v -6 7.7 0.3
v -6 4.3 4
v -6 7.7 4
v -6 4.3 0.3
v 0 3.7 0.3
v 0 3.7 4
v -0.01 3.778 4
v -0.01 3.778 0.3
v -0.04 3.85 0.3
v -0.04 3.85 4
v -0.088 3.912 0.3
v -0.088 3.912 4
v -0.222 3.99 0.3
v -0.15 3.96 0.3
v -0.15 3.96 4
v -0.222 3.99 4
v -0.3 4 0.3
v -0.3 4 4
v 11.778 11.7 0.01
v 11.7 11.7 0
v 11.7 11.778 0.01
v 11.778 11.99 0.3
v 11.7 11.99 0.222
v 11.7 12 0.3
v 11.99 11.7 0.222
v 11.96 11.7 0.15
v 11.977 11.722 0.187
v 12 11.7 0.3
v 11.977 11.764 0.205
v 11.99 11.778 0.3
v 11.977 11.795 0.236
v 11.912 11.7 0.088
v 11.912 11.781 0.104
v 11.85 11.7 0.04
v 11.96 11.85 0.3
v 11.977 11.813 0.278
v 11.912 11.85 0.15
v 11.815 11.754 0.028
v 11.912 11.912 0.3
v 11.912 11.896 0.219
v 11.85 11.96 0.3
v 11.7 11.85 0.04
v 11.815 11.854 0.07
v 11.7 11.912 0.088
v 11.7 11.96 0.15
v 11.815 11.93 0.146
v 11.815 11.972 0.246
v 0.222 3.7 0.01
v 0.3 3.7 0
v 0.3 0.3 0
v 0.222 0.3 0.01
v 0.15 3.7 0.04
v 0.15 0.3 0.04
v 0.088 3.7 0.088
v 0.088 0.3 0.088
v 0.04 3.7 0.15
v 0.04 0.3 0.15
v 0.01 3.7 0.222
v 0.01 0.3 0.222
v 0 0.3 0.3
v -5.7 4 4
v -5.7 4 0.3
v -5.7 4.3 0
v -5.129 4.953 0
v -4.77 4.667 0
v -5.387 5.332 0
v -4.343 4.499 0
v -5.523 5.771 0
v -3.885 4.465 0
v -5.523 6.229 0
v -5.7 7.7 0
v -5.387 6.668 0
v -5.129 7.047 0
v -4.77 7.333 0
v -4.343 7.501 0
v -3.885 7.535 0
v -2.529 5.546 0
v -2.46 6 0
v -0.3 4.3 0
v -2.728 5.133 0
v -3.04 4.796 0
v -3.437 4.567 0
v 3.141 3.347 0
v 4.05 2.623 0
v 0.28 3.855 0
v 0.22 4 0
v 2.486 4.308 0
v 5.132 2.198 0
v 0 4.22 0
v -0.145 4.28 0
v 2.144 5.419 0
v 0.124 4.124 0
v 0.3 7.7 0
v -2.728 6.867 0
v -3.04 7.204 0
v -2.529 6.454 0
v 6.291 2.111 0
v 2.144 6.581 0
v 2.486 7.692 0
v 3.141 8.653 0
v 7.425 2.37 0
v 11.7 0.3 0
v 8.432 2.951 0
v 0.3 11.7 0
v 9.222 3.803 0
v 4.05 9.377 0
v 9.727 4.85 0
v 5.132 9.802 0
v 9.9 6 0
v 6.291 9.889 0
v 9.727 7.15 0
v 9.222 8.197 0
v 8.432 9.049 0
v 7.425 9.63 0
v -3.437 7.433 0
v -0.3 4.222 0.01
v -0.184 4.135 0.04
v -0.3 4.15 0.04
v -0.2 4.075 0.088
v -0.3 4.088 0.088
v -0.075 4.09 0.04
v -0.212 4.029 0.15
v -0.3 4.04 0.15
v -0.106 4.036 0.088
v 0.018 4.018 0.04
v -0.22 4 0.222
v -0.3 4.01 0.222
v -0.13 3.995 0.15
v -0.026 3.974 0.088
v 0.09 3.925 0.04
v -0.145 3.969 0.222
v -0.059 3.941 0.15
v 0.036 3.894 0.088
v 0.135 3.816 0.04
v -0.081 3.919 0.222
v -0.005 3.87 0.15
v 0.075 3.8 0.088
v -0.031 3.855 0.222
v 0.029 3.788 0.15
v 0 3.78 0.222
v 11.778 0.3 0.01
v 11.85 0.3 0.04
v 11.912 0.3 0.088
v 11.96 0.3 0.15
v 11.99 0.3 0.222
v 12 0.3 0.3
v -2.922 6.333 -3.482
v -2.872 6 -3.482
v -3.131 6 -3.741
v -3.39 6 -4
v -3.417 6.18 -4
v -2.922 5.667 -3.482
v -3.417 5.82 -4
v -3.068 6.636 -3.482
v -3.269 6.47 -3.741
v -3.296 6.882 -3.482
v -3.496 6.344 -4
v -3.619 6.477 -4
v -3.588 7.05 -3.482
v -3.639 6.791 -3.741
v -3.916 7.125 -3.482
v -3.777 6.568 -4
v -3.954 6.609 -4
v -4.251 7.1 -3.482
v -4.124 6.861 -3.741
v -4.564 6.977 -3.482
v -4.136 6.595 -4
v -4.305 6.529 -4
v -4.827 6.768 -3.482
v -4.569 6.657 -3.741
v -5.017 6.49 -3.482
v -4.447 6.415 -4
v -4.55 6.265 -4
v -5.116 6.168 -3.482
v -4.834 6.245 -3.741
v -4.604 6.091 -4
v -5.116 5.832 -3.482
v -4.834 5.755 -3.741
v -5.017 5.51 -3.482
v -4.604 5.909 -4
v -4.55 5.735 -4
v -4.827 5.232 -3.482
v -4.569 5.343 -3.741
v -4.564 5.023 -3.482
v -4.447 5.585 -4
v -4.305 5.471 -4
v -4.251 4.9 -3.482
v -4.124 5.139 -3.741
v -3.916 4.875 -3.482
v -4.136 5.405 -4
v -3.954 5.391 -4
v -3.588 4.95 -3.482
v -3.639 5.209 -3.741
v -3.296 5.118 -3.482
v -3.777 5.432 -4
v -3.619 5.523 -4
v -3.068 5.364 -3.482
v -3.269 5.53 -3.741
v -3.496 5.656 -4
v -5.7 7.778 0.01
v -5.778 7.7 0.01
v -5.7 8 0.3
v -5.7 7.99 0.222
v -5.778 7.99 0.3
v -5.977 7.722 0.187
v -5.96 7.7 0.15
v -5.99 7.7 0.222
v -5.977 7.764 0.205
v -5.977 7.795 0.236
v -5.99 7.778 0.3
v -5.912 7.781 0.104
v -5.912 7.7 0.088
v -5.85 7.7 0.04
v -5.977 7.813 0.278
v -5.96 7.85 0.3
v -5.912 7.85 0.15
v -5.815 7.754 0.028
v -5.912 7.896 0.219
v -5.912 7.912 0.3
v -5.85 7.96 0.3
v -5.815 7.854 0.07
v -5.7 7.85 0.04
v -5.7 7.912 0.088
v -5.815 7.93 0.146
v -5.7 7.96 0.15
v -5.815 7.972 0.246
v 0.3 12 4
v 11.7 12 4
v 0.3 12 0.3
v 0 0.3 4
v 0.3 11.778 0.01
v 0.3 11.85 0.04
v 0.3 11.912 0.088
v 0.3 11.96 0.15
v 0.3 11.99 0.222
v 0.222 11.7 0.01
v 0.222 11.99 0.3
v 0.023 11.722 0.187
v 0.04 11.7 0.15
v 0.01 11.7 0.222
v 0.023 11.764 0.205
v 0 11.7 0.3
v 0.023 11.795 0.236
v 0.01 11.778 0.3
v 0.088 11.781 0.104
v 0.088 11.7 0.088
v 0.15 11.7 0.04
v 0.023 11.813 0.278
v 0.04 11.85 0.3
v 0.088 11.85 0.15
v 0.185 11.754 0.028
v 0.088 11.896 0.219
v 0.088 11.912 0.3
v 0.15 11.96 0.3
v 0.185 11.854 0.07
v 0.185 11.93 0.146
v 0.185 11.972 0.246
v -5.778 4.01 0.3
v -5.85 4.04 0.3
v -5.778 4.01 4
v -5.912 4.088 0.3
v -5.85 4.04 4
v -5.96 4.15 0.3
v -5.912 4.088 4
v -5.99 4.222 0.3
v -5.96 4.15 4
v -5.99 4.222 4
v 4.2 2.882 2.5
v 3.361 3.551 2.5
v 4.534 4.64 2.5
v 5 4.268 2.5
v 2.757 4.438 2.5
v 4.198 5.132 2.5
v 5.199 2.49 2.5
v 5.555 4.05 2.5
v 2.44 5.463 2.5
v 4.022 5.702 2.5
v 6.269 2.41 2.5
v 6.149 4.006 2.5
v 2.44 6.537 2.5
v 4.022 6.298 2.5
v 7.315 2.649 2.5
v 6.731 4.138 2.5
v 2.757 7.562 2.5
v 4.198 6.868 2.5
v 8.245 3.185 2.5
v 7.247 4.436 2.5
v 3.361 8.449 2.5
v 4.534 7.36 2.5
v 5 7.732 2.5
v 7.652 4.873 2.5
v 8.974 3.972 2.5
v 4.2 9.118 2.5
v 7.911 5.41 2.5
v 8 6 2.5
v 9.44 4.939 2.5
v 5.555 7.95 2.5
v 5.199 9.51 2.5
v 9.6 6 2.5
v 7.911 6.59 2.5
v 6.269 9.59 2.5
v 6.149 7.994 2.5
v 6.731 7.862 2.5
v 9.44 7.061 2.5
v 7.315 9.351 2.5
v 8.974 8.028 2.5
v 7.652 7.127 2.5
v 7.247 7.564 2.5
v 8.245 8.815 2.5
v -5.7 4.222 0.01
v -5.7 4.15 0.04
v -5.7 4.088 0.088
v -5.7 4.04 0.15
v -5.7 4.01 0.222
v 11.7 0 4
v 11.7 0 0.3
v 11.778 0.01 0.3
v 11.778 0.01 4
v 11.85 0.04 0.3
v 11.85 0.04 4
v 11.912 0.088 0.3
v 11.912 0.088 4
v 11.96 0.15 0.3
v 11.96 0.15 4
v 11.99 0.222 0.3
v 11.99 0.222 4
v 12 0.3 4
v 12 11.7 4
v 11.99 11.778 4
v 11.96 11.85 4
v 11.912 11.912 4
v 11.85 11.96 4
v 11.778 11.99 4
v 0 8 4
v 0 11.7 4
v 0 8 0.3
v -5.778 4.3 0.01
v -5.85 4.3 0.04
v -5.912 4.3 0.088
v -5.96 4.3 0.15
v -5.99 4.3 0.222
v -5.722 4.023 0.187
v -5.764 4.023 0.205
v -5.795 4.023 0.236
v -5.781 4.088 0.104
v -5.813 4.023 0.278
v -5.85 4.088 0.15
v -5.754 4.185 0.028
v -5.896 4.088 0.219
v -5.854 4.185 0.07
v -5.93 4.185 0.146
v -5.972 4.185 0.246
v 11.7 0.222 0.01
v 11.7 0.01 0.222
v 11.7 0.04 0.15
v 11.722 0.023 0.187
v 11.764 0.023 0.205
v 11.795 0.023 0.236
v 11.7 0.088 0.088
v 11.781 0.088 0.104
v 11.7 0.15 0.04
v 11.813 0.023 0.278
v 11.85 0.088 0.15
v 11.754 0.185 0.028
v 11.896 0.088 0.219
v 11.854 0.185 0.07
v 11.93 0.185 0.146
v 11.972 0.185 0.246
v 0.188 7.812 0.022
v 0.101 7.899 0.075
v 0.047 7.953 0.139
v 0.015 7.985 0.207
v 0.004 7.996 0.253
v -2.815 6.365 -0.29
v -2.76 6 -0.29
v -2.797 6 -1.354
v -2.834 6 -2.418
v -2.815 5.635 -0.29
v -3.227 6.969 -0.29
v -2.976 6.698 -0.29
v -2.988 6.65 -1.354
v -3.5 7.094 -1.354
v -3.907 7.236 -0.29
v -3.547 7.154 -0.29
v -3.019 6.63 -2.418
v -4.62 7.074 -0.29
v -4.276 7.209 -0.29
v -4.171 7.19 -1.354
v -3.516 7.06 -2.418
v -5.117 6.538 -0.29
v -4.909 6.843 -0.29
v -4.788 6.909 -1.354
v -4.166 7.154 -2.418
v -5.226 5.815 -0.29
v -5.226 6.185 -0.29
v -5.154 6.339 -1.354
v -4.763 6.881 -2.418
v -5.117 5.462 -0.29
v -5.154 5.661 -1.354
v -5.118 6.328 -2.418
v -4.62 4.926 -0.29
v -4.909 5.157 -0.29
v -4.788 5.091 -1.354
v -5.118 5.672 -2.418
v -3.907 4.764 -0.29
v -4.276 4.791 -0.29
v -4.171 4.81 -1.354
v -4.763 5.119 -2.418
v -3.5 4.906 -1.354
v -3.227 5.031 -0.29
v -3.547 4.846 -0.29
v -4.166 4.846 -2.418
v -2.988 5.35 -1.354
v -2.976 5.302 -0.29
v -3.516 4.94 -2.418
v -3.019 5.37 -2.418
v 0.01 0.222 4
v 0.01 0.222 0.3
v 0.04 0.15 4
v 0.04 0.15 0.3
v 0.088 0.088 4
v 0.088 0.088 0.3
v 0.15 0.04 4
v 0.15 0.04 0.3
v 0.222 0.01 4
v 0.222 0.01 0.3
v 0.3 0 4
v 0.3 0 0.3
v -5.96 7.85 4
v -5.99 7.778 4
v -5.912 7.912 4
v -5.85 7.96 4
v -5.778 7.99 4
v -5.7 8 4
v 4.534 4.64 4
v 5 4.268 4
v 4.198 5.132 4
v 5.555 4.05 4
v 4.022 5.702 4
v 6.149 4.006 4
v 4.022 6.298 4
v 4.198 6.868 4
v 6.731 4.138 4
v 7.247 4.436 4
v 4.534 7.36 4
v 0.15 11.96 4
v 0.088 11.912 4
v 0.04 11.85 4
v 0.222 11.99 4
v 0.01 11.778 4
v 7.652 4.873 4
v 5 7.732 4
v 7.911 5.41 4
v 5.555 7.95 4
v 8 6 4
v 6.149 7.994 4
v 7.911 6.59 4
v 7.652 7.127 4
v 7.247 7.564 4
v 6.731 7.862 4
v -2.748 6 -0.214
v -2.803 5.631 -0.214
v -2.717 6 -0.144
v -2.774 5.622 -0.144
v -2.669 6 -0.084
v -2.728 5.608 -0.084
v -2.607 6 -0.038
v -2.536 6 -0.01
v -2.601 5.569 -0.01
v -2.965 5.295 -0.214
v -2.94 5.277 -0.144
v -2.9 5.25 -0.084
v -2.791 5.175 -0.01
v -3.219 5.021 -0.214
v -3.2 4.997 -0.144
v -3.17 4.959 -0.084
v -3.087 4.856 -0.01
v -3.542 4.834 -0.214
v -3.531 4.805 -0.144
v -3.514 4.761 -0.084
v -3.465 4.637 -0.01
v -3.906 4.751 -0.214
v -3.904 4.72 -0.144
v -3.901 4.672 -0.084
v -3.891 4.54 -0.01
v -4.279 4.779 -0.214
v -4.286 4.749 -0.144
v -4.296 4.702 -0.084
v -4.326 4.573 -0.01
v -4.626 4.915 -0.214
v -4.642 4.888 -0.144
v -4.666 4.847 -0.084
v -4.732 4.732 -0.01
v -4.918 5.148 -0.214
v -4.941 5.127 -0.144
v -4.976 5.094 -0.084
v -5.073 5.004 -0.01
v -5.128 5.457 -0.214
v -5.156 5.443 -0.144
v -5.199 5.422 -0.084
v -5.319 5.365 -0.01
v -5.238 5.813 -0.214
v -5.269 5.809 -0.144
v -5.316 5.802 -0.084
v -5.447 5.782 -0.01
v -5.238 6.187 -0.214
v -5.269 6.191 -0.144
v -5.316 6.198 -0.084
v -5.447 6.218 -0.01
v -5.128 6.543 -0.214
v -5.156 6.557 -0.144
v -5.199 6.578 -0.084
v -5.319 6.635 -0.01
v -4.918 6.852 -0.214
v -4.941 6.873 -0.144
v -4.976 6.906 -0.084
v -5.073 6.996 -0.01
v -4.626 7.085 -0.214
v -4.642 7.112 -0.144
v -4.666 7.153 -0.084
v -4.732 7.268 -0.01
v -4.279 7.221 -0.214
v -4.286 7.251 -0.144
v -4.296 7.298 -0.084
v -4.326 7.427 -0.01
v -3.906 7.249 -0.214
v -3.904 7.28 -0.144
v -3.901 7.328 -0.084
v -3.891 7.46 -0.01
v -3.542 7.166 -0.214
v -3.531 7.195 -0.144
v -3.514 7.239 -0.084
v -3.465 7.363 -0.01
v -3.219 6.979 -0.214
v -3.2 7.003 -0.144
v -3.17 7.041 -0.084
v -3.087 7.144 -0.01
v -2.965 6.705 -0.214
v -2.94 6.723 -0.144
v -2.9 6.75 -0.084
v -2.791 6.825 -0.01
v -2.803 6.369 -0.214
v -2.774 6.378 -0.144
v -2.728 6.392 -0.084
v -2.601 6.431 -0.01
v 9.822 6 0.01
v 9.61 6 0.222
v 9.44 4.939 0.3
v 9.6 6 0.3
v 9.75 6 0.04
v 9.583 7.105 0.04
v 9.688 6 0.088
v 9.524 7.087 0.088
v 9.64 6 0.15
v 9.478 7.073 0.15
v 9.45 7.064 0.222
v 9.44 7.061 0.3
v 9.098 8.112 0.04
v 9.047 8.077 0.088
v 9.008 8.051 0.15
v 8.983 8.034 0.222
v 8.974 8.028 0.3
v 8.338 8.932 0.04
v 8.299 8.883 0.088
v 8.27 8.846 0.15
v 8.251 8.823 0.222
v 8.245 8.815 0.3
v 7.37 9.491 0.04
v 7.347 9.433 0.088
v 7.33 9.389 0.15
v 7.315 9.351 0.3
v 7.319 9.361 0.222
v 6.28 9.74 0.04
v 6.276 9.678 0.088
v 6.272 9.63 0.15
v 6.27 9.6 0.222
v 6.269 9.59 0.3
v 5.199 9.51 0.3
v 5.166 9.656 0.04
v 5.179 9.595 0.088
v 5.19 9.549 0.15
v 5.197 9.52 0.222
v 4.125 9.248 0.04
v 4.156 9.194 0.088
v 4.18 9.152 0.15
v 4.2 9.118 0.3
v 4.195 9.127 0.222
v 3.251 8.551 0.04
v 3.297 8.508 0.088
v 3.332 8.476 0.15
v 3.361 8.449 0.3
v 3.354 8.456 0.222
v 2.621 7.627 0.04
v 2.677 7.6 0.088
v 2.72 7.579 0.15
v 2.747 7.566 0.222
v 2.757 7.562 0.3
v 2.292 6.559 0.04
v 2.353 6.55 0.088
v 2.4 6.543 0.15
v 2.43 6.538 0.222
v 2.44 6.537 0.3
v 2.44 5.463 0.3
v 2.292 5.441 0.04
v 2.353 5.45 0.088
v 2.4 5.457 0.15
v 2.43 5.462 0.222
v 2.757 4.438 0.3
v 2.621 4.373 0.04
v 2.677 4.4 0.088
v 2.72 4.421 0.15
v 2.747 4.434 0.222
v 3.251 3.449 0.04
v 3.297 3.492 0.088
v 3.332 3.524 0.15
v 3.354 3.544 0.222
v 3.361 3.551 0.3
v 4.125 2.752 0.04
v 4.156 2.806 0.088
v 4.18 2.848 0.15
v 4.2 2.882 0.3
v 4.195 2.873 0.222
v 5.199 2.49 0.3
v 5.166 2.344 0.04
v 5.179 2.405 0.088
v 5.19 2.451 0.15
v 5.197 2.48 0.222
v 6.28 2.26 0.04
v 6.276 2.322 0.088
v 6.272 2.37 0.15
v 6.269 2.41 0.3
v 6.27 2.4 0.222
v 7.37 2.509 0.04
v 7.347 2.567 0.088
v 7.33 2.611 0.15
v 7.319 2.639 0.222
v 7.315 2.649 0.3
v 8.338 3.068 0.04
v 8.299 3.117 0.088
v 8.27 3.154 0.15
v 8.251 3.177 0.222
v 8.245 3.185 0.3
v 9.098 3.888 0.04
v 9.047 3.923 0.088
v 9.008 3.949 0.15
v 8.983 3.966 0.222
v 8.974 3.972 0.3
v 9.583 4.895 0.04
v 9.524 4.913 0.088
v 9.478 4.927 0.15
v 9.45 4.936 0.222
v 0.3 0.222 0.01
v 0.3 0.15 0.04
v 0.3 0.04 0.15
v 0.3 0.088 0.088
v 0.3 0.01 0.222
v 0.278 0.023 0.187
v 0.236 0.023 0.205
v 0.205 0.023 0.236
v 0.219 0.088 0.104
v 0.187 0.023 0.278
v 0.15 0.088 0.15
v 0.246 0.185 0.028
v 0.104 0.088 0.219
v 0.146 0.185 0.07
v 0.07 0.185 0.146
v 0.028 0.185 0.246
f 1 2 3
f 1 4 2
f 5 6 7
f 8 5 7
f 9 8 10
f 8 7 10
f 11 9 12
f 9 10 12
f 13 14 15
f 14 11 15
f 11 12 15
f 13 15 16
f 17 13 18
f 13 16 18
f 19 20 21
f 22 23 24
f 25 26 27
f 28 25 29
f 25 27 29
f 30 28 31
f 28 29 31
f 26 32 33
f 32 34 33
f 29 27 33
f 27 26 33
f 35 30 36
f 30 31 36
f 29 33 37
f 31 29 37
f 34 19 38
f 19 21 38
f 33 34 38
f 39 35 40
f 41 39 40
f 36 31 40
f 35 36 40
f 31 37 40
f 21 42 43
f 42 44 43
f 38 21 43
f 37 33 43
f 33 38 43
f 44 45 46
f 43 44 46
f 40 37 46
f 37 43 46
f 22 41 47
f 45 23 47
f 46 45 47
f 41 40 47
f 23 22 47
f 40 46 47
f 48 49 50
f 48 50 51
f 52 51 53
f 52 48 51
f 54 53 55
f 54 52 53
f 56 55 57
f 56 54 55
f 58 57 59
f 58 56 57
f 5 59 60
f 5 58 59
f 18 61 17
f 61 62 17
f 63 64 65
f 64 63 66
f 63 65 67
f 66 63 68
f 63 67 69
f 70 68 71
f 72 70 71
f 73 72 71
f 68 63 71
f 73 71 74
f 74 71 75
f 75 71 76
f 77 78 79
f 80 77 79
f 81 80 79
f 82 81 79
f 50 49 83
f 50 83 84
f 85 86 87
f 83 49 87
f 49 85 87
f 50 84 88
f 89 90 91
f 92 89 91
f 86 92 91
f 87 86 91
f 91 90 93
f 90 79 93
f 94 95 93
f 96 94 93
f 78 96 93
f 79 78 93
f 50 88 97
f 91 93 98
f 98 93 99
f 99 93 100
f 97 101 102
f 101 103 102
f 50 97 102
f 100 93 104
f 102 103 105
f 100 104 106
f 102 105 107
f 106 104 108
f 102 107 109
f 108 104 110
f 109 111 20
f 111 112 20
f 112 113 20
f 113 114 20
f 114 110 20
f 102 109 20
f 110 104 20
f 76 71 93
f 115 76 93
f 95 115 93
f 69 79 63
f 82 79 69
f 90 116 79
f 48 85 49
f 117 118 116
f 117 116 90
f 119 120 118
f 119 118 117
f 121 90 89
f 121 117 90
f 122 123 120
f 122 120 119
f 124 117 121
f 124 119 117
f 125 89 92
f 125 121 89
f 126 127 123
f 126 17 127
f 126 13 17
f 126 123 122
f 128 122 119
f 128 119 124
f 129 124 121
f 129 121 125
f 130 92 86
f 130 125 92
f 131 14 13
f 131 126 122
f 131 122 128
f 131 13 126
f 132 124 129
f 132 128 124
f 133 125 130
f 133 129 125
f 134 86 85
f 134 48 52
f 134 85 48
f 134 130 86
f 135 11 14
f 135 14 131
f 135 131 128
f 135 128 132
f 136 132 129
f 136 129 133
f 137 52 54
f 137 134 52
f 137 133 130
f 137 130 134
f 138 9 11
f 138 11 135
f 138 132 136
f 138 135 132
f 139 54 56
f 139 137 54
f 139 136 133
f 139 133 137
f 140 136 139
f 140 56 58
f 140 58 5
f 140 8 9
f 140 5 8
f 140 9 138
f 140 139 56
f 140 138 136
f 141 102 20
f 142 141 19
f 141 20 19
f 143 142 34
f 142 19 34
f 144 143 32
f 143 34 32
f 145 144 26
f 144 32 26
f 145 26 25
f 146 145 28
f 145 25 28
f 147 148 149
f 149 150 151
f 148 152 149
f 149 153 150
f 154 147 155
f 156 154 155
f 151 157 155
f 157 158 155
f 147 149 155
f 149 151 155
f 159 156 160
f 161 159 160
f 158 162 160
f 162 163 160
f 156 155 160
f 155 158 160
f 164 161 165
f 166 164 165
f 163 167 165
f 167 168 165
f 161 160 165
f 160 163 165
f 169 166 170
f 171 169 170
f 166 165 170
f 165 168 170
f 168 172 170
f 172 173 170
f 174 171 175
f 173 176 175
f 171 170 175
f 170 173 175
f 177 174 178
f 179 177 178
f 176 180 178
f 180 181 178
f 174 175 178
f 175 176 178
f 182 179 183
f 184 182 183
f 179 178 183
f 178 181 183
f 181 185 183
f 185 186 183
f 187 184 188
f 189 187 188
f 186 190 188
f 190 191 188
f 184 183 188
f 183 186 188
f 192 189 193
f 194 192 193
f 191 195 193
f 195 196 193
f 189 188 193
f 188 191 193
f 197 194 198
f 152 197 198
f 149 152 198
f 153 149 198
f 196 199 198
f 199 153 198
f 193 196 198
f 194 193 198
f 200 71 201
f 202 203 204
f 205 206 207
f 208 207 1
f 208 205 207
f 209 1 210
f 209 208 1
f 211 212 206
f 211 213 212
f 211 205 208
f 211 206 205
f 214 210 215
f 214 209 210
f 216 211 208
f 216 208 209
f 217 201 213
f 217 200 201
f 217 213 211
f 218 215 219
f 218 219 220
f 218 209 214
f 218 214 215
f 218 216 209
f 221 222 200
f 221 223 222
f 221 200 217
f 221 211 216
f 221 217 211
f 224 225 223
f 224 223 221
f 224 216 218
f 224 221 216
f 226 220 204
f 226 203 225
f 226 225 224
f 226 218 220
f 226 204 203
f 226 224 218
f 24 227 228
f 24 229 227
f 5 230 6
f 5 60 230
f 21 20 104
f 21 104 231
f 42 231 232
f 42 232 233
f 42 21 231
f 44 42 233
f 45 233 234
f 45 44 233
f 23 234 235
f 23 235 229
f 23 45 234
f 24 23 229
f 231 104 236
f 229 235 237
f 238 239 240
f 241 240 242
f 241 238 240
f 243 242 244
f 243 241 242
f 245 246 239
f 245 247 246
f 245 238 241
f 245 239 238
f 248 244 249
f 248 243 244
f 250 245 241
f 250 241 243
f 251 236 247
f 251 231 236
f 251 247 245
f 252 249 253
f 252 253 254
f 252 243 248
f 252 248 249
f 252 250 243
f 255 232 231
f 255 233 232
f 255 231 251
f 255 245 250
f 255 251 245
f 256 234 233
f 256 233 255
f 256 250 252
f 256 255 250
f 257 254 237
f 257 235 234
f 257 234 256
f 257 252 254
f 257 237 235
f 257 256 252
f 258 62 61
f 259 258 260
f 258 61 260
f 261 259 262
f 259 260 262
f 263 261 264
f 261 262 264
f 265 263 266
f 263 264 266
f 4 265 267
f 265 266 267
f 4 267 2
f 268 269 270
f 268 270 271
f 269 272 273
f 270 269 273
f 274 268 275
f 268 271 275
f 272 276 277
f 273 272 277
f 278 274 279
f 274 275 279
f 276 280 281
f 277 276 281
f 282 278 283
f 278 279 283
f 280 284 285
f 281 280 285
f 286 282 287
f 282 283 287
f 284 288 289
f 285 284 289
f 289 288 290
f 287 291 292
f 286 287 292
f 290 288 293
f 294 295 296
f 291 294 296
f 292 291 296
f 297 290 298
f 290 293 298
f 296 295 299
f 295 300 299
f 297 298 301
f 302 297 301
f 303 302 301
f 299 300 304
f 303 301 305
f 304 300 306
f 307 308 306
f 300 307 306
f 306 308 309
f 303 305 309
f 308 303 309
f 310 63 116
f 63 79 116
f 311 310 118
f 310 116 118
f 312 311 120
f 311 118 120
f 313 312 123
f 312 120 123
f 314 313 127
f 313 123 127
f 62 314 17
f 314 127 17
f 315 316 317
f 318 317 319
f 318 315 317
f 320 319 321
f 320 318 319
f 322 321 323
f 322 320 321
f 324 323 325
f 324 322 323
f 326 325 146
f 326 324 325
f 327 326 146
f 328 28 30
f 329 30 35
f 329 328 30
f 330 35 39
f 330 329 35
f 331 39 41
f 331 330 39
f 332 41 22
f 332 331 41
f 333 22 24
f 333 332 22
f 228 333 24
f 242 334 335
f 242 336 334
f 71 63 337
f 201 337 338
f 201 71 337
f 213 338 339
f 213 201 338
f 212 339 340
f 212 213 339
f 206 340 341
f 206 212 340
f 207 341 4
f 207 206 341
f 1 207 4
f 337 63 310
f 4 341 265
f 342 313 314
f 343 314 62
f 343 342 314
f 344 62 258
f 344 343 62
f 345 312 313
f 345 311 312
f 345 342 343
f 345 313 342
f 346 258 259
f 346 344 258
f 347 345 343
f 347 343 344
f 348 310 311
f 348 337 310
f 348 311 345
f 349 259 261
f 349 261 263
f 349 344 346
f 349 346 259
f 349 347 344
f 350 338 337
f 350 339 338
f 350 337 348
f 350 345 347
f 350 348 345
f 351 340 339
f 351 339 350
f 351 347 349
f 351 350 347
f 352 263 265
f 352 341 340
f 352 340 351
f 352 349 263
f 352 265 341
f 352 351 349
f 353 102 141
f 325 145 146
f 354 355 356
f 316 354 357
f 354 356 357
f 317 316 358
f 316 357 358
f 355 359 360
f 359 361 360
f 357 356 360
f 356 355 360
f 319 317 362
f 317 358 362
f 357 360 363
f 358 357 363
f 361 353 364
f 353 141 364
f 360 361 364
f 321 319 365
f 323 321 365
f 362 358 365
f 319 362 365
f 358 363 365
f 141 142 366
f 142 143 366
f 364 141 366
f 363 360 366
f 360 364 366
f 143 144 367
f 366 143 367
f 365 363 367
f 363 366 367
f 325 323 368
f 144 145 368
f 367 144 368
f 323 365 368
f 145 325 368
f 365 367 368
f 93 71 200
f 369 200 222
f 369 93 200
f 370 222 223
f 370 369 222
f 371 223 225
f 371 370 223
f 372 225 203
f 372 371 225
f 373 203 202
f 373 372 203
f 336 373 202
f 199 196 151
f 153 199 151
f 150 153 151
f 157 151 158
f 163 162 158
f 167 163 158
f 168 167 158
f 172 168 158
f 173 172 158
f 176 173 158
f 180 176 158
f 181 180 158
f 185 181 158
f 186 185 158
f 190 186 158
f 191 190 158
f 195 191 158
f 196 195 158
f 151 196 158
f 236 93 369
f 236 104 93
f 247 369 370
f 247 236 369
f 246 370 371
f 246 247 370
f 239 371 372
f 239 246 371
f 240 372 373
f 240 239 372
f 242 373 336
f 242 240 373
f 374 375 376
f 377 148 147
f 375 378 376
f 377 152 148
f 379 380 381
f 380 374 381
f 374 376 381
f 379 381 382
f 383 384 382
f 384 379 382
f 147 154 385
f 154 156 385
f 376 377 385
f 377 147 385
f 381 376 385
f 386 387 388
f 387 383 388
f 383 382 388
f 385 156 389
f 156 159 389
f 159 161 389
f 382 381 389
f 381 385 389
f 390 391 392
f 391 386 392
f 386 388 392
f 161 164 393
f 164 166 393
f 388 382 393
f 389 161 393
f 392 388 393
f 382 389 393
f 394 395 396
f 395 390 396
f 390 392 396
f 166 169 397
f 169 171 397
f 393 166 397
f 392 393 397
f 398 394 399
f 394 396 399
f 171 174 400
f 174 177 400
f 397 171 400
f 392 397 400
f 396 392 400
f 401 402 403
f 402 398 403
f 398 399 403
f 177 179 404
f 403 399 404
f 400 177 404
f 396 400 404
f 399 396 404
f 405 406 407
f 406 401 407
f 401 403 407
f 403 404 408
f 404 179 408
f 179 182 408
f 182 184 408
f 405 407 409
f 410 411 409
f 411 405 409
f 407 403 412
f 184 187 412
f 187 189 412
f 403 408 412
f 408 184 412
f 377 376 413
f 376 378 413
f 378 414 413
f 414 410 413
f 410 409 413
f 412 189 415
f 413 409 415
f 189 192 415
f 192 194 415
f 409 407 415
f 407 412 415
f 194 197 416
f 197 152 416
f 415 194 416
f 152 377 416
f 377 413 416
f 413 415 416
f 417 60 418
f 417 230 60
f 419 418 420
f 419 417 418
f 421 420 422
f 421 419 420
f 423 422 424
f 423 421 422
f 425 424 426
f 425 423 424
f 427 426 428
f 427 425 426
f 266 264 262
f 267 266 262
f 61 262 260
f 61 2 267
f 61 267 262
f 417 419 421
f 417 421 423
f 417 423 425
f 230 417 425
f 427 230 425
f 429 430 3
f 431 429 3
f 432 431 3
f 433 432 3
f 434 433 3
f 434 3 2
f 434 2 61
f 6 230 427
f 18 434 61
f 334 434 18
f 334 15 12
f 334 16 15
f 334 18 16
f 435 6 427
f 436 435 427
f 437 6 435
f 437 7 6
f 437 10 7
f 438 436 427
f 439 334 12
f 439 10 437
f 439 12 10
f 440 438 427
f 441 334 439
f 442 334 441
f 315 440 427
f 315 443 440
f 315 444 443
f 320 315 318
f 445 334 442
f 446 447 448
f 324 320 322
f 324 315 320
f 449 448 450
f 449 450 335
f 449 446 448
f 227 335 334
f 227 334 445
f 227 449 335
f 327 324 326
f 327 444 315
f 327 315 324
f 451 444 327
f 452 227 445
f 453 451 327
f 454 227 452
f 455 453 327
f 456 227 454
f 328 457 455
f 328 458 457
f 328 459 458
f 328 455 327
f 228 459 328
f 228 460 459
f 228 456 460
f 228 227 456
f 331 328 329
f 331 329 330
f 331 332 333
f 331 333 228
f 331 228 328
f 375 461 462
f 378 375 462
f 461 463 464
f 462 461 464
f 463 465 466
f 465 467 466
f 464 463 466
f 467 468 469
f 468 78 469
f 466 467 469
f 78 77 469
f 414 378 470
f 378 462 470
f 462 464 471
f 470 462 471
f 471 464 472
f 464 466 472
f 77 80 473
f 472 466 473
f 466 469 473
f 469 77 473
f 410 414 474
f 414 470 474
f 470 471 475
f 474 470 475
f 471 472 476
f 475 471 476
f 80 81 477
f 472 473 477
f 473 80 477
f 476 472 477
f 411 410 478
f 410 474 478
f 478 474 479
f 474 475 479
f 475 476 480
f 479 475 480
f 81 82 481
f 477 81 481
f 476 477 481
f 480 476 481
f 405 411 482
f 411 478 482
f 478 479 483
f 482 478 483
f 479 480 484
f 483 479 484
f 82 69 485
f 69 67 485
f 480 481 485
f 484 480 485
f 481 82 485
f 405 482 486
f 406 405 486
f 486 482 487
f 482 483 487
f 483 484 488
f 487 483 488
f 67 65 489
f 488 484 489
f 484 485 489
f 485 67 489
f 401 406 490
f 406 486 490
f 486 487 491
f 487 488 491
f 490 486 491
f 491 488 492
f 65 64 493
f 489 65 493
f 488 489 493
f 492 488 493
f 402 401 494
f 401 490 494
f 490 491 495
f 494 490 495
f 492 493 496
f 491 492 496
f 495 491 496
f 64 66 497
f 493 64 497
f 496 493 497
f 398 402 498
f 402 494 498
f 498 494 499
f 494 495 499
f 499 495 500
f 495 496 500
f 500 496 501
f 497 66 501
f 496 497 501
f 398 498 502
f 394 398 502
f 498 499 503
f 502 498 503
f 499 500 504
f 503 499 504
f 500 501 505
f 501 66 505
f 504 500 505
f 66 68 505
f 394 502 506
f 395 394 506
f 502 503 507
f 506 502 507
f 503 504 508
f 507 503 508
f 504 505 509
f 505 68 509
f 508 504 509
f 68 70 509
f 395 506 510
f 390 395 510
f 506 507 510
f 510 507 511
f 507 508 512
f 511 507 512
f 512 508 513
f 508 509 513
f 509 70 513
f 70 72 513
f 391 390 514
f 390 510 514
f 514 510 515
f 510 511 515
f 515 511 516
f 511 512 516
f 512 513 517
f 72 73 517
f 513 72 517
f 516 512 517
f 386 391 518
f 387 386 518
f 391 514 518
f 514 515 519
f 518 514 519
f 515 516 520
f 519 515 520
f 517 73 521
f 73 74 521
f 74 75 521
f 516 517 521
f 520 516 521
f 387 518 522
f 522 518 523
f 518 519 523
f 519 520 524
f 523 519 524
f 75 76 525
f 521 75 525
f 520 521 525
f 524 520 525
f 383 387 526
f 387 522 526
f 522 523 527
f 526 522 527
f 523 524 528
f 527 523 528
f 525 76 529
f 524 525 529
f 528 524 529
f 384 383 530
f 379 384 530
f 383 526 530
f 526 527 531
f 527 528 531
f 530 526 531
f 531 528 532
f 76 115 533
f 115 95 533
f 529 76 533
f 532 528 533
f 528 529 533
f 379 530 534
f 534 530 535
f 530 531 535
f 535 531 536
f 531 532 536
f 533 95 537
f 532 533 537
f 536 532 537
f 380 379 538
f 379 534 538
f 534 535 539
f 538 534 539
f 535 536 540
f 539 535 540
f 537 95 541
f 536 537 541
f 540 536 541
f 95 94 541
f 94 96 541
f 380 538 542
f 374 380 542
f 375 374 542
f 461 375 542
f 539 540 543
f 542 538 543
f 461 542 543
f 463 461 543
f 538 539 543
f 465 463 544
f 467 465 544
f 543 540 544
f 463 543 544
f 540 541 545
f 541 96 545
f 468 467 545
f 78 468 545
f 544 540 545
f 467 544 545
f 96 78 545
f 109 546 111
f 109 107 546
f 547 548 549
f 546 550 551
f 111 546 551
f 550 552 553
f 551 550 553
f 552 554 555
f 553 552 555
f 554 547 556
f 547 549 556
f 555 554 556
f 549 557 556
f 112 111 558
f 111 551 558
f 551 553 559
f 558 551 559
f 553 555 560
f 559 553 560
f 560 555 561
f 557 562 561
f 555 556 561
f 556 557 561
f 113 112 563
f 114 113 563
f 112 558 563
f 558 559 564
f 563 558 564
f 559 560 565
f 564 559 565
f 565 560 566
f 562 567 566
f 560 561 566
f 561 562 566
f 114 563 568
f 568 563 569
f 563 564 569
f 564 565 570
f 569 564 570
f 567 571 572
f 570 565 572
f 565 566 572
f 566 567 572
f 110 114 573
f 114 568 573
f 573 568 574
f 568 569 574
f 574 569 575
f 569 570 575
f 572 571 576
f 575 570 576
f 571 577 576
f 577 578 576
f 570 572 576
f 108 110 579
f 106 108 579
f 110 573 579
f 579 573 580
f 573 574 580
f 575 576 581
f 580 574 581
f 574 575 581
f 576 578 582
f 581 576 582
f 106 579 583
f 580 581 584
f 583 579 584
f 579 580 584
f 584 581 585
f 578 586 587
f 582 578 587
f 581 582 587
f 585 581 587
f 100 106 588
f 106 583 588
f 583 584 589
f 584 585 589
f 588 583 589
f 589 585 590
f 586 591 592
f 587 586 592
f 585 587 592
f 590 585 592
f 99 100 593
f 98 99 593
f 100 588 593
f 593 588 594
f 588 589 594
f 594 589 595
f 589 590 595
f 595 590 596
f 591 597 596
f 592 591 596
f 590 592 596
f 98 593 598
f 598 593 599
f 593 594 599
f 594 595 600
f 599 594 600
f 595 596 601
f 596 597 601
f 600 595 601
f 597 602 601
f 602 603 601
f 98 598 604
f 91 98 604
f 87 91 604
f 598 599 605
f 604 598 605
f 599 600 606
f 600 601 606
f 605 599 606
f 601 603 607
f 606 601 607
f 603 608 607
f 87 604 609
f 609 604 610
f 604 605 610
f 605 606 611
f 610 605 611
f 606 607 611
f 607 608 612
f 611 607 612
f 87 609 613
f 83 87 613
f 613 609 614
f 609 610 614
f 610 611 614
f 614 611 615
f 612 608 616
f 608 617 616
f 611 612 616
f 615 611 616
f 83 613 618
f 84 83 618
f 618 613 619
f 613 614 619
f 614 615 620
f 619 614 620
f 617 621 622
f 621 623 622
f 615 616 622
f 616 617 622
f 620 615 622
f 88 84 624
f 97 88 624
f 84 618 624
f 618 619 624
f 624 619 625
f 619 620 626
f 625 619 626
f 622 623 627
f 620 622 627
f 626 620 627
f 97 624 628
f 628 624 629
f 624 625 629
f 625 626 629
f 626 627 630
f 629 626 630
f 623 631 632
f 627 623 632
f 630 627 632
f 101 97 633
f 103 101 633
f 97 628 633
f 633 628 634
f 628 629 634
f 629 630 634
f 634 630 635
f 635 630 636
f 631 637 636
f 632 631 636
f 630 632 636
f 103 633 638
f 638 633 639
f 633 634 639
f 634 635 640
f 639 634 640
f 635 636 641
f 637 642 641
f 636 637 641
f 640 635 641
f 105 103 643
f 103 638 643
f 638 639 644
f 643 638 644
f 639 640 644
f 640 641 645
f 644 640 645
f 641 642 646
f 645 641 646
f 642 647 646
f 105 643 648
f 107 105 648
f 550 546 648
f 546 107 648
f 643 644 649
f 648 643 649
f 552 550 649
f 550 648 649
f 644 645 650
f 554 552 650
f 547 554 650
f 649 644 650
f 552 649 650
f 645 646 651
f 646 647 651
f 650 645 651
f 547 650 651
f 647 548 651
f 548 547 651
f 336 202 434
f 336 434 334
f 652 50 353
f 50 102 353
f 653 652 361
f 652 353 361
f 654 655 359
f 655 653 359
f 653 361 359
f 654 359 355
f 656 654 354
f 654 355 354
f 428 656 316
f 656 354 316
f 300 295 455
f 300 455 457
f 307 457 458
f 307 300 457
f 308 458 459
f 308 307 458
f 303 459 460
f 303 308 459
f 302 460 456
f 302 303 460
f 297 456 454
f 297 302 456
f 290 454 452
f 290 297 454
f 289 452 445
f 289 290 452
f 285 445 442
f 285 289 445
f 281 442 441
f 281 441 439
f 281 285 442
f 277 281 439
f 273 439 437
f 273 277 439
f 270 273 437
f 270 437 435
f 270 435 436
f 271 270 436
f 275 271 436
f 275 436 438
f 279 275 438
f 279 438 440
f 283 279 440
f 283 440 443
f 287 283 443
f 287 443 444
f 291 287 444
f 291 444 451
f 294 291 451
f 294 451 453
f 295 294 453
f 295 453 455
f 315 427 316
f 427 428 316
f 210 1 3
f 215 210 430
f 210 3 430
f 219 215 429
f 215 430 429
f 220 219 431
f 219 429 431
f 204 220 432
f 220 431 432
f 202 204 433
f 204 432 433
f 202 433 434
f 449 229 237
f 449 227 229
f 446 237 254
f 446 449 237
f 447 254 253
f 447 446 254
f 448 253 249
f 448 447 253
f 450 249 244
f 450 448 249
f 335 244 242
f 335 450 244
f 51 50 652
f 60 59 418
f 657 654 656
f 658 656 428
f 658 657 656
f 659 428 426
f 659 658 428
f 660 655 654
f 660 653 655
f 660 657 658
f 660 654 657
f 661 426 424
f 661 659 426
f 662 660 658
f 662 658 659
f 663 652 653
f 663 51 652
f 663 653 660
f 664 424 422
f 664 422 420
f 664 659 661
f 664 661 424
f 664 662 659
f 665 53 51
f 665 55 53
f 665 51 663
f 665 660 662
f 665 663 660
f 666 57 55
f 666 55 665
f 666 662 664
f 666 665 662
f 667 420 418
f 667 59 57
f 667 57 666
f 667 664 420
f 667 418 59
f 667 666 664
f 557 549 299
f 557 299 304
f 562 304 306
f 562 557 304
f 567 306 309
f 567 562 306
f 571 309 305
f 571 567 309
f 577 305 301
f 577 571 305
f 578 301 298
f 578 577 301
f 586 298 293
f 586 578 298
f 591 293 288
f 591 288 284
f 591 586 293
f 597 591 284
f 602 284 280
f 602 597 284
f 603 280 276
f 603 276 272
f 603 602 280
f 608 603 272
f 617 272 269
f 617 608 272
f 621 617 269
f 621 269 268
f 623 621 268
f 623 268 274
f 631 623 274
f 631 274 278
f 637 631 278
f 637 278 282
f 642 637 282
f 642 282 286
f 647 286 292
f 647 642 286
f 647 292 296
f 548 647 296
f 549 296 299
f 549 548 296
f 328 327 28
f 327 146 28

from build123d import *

# Parameters (mm, degrees)
ESQUISSE1_W             = 12
ESQUISSE1_H             = 12
BOSS_EXTRU_1_DEPTH      = 4
ESQUISSE2_R             = 2
ENL_V_MAT_EXTRU_2_DEPTH = 4
ESQUISSE3_R             = 3.6
ENL_V_MAT_EXTRU_3_DEPTH = 2.5
ESQUISSE4_W             = 6
ESQUISSE4_H             = 4
BOSS_EXTRU_2_DEPTH      = 4
ESQUISSE5_R             = 1.25
BOSS_EXTRU_3_DEPTH      = 4
BOSS_EXTRU_3_TAPER      = 2
CHANFREIN1_SIZE2        = 0.5
CHANFREIN1_SIZE         = 0.518407978
CONG_1_R                = 0.3


with BuildPart() as part:
    # Esquisse1 → Boss.-Extru.1 (new body)
    with BuildSketch(Plane.XY):
        with Locations((6, 6)):
            Rectangle(ESQUISSE1_W, ESQUISSE1_H)
    extrude(amount=BOSS_EXTRU_1_DEPTH)

    # Esquisse2 → Enlèv. mat.-Extru.2 (cut)
    with BuildSketch(Plane.XY):
        with Locations((6, 6)):
            Circle(ESQUISSE2_R)
    extrude(amount=ENL_V_MAT_EXTRU_2_DEPTH, mode=Mode.SUBTRACT)

    # Esquisse3 → Enlèv. mat.-Extru.3 (cut)
    with BuildSketch(Plane.XY):
        with Locations((6, 6)):
            Circle(ESQUISSE3_R)
    extrude(amount=ENL_V_MAT_EXTRU_3_DEPTH, mode=Mode.SUBTRACT)

    # Esquisse4 → Boss.-Extru.2 (add)
    with BuildSketch(Plane.XY):
        with Locations((-3, 6)):
            Rectangle(ESQUISSE4_W, ESQUISSE4_H)
    extrude(amount=BOSS_EXTRU_2_DEPTH)

    # Esquisse5 → Boss.-Extru.3 (add)
    with BuildSketch(Plane.XY):
        with Locations((-4, 6)):
            Circle(ESQUISSE5_R)
    extrude(amount=-BOSS_EXTRU_3_DEPTH, taper=BOSS_EXTRU_3_TAPER)

    # Chanfrein1
    chanfrein1_edges = [part.edges().sort_by_distance(p)[0] for p in [
        (-5.110316922, 6, -4),
    ]]
    chamfer(chanfrein1_edges, length=CHANFREIN1_SIZE, length2=CHANFREIN1_SIZE2)

    # Congé1
    cong_1_edges = [part.edges().sort_by_distance(p)[0] for p in [
        (2.4, 6, 0),
        (0, 2, 0),
        (0, 4, 2),
        (-3, 8, 0),
        (-6, 6, 0),
        (-6, 8, 2),
        (-3, 4, 0),
        (-6, 4, 2),
        (-5.25, 6, 0),
        (6, 12, 0),
        (12, 6, 0),
        (6, 0, 0),
        (0, 10, 0),
        (0, 12, 2),
        (12, 12, 2),
        (12, 0, 2),
        (0, 0, 2),
    ]]
    fillet(cong_1_edges, radius=CONG_1_R)


solid = part.part
